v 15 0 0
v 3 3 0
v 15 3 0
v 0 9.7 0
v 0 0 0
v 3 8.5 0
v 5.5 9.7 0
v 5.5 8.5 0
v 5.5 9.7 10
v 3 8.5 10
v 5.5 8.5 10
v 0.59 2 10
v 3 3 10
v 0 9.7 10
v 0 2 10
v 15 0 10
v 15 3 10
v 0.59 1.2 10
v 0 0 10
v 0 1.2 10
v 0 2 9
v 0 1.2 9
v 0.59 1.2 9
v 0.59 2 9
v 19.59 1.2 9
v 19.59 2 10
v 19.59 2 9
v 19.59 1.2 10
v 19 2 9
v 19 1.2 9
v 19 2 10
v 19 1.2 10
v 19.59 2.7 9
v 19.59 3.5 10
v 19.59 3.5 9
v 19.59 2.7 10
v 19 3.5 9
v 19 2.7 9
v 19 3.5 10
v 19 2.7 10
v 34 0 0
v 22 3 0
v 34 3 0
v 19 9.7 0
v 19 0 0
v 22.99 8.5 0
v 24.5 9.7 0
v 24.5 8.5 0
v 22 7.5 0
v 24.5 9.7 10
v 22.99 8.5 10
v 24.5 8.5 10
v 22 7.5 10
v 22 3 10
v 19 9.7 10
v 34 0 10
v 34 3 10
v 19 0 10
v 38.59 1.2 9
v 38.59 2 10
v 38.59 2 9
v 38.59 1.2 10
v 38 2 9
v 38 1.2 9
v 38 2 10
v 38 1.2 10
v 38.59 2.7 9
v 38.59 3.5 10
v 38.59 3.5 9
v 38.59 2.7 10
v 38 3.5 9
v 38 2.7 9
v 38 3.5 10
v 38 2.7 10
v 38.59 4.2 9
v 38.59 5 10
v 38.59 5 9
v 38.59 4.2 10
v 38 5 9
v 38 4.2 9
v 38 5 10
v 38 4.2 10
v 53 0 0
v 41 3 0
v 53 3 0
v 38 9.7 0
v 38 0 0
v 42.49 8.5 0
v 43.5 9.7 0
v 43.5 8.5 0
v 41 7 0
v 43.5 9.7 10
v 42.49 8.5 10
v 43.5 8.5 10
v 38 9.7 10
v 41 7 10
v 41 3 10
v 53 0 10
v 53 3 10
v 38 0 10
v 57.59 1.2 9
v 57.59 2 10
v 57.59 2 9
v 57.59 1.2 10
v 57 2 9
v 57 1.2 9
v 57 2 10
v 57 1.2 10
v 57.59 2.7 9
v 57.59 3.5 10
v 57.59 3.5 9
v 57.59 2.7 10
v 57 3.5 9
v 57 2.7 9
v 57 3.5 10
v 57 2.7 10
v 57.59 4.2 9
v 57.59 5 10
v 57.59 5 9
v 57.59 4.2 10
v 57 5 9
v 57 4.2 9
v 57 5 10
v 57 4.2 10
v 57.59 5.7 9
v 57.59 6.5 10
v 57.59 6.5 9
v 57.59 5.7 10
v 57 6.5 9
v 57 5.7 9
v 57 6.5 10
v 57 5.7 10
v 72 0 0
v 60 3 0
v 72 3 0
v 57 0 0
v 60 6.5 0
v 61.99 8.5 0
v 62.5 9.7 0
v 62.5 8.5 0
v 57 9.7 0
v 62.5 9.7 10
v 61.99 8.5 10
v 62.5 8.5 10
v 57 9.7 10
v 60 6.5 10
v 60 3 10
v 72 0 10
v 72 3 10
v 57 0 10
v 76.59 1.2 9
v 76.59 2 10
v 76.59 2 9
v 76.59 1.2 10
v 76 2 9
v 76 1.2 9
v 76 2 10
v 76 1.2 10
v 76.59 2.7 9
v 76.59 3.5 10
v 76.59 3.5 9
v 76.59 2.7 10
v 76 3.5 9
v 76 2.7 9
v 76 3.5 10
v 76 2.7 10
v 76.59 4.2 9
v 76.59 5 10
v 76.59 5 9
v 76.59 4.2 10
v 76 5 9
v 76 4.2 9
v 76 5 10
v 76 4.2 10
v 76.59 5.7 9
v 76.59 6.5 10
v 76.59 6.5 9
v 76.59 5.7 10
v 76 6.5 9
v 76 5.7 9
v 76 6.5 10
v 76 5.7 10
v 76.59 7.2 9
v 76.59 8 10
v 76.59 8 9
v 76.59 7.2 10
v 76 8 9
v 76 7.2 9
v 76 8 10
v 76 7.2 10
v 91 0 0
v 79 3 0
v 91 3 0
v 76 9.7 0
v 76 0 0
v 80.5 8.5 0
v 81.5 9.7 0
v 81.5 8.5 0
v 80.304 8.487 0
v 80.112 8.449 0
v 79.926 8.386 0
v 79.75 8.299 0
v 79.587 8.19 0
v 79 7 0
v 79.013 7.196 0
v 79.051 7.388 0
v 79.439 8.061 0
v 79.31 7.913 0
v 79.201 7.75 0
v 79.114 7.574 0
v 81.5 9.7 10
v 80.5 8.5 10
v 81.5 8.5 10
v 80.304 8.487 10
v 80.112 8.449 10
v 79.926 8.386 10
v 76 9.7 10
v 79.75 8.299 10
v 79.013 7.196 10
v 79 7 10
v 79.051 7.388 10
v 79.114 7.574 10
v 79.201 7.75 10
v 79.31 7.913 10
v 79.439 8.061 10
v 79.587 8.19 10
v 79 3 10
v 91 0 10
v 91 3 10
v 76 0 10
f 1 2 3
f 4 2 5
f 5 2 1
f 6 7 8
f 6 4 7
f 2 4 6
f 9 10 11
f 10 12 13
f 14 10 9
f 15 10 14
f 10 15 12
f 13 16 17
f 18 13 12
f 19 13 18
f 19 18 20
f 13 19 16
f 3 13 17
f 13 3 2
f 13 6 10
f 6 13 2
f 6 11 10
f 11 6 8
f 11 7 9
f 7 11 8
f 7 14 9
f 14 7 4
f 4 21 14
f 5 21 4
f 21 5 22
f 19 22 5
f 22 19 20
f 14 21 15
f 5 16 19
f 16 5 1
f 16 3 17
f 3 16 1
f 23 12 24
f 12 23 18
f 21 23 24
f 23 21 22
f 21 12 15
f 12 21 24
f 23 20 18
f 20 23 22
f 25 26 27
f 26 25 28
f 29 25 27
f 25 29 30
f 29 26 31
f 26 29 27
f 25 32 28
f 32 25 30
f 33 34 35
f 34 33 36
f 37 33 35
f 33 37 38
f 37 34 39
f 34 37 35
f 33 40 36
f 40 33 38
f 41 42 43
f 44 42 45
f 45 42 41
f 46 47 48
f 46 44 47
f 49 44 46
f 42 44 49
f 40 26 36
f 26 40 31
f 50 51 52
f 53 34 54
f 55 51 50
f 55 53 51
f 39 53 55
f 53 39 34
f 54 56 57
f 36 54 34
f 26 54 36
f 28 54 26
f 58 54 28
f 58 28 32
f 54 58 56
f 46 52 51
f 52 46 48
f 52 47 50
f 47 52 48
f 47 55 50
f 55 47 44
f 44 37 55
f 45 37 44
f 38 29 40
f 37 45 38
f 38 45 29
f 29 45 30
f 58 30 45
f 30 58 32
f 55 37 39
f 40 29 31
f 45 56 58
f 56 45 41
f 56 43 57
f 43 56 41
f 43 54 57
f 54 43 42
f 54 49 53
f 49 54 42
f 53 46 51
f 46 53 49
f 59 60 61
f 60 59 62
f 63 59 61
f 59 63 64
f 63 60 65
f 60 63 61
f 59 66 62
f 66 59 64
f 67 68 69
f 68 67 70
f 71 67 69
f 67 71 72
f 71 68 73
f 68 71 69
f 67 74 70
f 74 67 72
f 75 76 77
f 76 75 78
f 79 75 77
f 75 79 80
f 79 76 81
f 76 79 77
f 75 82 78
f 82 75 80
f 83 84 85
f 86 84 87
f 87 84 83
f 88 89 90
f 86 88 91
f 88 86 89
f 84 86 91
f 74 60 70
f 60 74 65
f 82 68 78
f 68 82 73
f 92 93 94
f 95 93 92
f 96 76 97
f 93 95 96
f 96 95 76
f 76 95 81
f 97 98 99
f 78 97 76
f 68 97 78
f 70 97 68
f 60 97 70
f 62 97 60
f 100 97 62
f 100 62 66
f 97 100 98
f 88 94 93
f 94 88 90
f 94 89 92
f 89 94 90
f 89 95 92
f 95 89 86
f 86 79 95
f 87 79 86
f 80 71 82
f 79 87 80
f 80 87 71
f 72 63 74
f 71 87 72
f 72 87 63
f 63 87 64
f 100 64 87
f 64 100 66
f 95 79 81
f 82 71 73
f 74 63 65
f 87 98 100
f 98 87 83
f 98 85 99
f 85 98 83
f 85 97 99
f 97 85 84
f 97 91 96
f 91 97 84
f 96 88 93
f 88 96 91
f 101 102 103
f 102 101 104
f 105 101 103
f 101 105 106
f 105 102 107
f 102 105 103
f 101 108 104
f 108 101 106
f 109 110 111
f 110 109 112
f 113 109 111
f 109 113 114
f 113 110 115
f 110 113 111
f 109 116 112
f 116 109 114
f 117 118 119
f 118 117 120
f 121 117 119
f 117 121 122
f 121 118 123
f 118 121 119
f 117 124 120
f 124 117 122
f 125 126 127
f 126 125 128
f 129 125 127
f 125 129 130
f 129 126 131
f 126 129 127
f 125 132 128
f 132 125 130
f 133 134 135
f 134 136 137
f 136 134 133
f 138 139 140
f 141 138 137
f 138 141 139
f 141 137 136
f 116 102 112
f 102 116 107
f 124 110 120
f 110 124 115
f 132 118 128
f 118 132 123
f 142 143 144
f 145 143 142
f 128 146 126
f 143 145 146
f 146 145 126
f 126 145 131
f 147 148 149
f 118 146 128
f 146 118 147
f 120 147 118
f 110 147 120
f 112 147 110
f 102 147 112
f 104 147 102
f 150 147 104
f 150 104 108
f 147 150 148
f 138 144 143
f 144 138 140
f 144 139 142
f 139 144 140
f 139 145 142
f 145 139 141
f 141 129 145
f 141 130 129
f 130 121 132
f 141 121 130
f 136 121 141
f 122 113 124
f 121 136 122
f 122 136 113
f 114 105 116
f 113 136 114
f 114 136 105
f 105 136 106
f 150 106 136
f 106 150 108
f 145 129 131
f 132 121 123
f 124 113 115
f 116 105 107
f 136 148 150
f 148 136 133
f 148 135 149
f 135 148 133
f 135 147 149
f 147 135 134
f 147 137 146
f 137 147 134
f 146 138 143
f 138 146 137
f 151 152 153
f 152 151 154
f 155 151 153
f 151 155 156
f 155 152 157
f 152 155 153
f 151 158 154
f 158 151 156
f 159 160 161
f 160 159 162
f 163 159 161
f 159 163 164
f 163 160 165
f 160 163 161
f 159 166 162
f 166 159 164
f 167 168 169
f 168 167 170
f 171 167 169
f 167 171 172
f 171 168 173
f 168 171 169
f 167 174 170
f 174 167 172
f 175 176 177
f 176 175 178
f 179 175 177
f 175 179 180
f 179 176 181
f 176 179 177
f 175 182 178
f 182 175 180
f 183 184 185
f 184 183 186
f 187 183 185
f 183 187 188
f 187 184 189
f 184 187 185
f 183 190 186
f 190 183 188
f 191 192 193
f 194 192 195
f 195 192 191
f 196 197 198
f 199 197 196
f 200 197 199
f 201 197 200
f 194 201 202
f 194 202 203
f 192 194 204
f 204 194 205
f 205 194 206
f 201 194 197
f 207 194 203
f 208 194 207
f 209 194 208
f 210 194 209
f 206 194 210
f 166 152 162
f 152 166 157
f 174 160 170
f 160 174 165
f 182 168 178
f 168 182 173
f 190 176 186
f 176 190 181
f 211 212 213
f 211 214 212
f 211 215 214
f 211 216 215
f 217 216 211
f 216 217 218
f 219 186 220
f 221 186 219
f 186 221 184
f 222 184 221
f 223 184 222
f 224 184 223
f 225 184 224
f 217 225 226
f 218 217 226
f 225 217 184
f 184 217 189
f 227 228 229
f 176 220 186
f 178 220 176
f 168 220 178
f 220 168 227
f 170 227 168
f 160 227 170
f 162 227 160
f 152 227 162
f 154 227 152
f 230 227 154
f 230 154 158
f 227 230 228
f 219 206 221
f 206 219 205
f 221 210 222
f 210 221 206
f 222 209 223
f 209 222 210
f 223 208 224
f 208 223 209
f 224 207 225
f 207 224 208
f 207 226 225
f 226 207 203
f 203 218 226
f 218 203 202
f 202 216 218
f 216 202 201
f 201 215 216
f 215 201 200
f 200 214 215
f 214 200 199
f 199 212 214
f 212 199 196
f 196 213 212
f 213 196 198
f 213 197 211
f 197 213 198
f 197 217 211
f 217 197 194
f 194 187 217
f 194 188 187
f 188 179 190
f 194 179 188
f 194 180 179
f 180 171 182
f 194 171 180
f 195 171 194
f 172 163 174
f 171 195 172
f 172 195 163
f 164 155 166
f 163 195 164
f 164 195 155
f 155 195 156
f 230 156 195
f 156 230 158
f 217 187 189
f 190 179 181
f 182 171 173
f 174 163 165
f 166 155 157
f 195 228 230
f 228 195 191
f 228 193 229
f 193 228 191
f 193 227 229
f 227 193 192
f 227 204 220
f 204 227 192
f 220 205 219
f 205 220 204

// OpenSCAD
// Edge gauge for the tablet's lip, cyberdeck1 rev 0.1.
//
// Five short clips. Each has the cross-section of the tablet holder at a side lip: floor,
// wall and lip, with the same pocket height and lip as ../case/case.scad. They differ in
// the shape under the lip, in the corner where the tablet's rounded edge leaves room.
// Slide each clip onto the tablet's edge to find the fullest shape that still slides.
//
// The clips print standing on end, so the profile is exact and nothing overhangs.
//
// Make the plate:  openscad-nightly -o edge_gauge_plate.stl edge_gauge.scad

include <../case/case.scad>
view = "none";

LEN   = 10;     // length of each clip
G_WALL = 3;
REACH = 12;     // how far the floor reaches under the tablet

// [kind, size]: the fill under the lip, in the corner next to the wall.
SHAPES = [["flat", 0], ["chamfer", 1.0], ["chamfer", 1.5], ["chamfer", 2.0], ["round", 1.5]];

module profile(shape) {
    top = T_FLOOR + TPD;            // underside of the lip
    polygon([[0, 0], [G_WALL + REACH, 0], [G_WALL + REACH, T_FLOOR], [G_WALL, T_FLOOR],
             [G_WALL, top], [G_WALL + OV, top], [G_WALL + OV, top + LIP], [0, top + LIP]]);
    if (shape[0] == "chamfer")
        polygon([[G_WALL, top + 0.01], [G_WALL + shape[1], top + 0.01], [G_WALL, top - shape[1]]]);
    if (shape[0] == "round")        // a concave quarter circle
        difference() {
            translate([G_WALL, top - shape[1]]) square([shape[1], shape[1] + 0.01]);
            translate([G_WALL + shape[1], top - shape[1]]) circle(r = shape[1], $fn = 48);
        }
}

module clip(i) {
    difference() {
        linear_extrude(LEN) profile(SHAPES[i]);
        // notches on the back of the wall: clip 1 has one notch, clip 5 has five
        for (k = [0 : i]) translate([-0.01, 1.2 + 1.5 * k, LEN - 1]) cube([0.6, 0.8, 1.01]);
    }
}

for (i = [0 : len(SHAPES) - 1]) translate([i * (G_WALL + REACH + 4), 0, 0]) clip(i);
